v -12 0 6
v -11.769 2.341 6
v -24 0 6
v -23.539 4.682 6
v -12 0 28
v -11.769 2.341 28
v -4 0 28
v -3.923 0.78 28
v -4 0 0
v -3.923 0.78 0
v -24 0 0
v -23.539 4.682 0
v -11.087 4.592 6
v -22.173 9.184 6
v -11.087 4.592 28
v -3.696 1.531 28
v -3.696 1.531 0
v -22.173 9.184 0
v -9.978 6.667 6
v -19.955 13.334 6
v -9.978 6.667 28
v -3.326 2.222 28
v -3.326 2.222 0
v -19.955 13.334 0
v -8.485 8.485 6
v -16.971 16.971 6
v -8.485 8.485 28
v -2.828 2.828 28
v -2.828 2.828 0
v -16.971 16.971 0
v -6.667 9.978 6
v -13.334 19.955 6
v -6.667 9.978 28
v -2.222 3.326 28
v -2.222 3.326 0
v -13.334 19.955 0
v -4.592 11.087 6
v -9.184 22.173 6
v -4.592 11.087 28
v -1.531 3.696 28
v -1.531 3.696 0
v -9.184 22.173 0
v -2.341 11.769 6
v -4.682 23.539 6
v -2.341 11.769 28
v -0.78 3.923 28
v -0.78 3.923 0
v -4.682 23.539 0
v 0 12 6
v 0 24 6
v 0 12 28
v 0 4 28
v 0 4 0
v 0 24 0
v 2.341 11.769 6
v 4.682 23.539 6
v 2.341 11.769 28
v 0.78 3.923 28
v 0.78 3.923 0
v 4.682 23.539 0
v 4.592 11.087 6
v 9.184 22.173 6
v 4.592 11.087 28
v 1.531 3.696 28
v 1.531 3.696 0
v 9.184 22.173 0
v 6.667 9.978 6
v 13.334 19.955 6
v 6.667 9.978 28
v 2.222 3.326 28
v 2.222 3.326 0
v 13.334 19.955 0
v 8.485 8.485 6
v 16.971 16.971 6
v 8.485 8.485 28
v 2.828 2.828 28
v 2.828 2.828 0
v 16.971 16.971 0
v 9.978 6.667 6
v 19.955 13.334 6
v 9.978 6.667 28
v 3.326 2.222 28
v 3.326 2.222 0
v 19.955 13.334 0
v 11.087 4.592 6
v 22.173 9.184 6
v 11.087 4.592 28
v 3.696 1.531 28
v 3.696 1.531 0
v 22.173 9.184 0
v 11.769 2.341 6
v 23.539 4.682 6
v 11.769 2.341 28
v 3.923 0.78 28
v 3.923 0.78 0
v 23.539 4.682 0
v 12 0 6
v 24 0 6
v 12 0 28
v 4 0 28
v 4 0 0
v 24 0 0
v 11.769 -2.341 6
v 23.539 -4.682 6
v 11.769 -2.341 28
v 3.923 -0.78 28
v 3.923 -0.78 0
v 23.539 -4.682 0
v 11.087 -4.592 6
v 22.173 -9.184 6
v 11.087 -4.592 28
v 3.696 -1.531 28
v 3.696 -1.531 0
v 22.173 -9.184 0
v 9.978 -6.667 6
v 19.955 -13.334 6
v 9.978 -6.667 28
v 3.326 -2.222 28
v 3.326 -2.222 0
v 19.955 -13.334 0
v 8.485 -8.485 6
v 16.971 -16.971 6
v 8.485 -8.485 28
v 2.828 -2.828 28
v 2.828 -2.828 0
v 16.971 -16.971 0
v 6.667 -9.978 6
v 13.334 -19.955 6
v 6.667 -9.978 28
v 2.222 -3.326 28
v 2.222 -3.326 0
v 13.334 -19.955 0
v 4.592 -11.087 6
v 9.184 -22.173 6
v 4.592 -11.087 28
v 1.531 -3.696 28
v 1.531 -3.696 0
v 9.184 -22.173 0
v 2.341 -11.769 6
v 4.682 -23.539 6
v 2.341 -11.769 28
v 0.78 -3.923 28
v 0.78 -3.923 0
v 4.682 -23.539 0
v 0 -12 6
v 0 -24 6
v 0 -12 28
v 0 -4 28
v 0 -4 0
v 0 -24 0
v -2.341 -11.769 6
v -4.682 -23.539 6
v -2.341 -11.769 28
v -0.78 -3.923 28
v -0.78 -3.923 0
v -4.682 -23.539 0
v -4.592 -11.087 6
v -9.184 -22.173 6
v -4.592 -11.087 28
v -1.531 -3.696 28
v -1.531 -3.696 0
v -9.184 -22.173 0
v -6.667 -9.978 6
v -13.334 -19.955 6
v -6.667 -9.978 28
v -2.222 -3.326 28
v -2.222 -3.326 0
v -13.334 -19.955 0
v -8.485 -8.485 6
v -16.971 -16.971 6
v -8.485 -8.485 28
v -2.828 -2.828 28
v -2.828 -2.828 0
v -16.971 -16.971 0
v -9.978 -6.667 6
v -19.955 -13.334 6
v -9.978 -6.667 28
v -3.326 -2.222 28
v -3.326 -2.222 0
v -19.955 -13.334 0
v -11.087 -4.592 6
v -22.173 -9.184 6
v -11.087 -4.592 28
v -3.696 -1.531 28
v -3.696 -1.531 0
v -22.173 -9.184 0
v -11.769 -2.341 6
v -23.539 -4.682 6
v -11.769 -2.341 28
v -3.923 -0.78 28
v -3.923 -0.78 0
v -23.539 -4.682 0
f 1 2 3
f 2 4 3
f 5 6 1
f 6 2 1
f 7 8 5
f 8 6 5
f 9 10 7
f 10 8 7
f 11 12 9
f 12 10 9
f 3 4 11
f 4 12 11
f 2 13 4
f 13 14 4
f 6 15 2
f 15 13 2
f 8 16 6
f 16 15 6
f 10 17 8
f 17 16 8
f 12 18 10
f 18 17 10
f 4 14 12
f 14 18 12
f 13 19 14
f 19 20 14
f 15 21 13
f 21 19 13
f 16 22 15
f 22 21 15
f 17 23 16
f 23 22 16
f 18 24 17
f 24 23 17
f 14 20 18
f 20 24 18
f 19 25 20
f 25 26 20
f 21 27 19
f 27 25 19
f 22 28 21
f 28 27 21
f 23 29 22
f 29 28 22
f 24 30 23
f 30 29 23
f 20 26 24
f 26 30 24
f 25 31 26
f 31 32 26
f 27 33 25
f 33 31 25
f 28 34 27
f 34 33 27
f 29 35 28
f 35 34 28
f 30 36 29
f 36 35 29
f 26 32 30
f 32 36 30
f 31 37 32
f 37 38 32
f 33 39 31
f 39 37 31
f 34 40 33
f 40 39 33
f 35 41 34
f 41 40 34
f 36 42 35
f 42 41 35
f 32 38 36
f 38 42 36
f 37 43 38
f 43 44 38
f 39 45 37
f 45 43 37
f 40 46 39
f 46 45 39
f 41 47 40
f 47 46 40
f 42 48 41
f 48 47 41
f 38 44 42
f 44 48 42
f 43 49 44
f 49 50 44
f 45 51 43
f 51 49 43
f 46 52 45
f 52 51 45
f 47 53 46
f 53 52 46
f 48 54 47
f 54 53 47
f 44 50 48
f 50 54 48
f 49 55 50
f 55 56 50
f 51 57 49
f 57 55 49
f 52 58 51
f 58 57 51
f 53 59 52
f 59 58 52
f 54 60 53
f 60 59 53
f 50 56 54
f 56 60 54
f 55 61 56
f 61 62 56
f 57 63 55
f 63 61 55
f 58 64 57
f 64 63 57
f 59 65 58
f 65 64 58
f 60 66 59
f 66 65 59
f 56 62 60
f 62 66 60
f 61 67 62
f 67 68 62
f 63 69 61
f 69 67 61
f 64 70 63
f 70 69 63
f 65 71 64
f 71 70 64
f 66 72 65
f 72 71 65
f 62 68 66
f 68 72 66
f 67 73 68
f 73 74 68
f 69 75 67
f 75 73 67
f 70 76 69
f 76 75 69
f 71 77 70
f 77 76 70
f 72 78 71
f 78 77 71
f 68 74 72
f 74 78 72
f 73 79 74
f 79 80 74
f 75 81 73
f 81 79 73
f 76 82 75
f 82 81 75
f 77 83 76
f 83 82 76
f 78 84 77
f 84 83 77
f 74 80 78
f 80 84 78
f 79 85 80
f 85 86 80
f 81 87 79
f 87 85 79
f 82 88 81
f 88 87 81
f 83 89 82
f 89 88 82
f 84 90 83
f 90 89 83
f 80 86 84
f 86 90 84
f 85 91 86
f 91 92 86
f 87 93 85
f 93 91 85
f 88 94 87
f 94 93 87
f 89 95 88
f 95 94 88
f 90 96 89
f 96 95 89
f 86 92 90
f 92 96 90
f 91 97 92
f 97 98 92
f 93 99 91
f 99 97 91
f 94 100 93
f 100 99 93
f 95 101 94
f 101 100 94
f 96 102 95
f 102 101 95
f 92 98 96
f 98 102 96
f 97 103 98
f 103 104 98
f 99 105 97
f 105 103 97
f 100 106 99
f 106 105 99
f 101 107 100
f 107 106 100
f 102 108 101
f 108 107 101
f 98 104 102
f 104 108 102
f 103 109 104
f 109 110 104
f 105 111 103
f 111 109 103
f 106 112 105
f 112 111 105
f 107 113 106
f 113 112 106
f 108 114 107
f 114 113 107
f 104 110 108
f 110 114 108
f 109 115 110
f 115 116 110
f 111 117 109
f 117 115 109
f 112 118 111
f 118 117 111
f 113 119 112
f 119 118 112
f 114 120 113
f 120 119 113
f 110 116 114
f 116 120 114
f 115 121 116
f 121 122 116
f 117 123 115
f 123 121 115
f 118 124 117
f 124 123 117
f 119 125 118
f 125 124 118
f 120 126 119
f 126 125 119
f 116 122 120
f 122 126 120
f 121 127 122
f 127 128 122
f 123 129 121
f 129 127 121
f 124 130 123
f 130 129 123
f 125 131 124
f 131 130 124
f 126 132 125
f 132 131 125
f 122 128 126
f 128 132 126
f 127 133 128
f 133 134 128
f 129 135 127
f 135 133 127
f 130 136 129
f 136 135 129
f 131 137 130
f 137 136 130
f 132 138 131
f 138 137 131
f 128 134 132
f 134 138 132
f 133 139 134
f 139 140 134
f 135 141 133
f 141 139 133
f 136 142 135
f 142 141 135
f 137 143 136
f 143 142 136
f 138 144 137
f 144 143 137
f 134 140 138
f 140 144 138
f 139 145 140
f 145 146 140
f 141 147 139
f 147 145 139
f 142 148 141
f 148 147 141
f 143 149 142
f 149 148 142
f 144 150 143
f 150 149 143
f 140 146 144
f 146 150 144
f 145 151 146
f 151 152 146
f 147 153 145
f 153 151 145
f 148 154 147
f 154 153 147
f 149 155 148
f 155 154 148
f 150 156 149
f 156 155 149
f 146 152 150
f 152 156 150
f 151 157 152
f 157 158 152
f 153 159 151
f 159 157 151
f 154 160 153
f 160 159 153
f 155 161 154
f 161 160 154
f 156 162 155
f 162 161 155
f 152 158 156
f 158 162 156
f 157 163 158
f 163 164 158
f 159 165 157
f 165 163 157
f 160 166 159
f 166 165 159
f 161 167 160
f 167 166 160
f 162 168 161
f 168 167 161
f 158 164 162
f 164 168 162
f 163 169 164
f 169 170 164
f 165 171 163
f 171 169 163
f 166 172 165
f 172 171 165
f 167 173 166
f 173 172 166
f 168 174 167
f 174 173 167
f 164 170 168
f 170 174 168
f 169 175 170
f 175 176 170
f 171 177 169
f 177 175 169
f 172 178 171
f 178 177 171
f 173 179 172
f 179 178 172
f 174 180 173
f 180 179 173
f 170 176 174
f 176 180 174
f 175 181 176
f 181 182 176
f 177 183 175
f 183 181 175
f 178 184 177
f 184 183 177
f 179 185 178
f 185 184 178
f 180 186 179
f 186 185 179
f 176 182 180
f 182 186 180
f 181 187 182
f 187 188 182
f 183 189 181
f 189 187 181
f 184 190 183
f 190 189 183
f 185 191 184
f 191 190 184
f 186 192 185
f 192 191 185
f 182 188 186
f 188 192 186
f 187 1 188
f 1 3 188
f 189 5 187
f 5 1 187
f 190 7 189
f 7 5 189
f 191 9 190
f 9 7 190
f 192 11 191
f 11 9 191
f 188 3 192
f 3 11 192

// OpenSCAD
$fn = 32;

// ----------------------------------------------------------------------
// Revolved part: flanged bushing R24
// ----------------------------------------------------------------------

// --- parameters (mm) ---
bore_r = 4;               // bore radius
flange_r = 24;            // flange radius
flange_h = 6;             // flange thickness
sleeve_r = 12;            // sleeve radius
total_h = 28;             // overall height
revolve_angle = 360;      // revolve sweep, degrees

bore_d = 2 * bore_r;
flange_d = 2 * flange_r;
sleeve_d = 2 * sleeve_r;

profile = [[4, 0], [24, 0], [24, 6], [12, 6], [12, 28], [4, 28]];  // primary outline, 6 points, counter clockwise

// --- the one profile operation ---
rotate_extrude(angle = revolve_angle) polygon(points = profile);
